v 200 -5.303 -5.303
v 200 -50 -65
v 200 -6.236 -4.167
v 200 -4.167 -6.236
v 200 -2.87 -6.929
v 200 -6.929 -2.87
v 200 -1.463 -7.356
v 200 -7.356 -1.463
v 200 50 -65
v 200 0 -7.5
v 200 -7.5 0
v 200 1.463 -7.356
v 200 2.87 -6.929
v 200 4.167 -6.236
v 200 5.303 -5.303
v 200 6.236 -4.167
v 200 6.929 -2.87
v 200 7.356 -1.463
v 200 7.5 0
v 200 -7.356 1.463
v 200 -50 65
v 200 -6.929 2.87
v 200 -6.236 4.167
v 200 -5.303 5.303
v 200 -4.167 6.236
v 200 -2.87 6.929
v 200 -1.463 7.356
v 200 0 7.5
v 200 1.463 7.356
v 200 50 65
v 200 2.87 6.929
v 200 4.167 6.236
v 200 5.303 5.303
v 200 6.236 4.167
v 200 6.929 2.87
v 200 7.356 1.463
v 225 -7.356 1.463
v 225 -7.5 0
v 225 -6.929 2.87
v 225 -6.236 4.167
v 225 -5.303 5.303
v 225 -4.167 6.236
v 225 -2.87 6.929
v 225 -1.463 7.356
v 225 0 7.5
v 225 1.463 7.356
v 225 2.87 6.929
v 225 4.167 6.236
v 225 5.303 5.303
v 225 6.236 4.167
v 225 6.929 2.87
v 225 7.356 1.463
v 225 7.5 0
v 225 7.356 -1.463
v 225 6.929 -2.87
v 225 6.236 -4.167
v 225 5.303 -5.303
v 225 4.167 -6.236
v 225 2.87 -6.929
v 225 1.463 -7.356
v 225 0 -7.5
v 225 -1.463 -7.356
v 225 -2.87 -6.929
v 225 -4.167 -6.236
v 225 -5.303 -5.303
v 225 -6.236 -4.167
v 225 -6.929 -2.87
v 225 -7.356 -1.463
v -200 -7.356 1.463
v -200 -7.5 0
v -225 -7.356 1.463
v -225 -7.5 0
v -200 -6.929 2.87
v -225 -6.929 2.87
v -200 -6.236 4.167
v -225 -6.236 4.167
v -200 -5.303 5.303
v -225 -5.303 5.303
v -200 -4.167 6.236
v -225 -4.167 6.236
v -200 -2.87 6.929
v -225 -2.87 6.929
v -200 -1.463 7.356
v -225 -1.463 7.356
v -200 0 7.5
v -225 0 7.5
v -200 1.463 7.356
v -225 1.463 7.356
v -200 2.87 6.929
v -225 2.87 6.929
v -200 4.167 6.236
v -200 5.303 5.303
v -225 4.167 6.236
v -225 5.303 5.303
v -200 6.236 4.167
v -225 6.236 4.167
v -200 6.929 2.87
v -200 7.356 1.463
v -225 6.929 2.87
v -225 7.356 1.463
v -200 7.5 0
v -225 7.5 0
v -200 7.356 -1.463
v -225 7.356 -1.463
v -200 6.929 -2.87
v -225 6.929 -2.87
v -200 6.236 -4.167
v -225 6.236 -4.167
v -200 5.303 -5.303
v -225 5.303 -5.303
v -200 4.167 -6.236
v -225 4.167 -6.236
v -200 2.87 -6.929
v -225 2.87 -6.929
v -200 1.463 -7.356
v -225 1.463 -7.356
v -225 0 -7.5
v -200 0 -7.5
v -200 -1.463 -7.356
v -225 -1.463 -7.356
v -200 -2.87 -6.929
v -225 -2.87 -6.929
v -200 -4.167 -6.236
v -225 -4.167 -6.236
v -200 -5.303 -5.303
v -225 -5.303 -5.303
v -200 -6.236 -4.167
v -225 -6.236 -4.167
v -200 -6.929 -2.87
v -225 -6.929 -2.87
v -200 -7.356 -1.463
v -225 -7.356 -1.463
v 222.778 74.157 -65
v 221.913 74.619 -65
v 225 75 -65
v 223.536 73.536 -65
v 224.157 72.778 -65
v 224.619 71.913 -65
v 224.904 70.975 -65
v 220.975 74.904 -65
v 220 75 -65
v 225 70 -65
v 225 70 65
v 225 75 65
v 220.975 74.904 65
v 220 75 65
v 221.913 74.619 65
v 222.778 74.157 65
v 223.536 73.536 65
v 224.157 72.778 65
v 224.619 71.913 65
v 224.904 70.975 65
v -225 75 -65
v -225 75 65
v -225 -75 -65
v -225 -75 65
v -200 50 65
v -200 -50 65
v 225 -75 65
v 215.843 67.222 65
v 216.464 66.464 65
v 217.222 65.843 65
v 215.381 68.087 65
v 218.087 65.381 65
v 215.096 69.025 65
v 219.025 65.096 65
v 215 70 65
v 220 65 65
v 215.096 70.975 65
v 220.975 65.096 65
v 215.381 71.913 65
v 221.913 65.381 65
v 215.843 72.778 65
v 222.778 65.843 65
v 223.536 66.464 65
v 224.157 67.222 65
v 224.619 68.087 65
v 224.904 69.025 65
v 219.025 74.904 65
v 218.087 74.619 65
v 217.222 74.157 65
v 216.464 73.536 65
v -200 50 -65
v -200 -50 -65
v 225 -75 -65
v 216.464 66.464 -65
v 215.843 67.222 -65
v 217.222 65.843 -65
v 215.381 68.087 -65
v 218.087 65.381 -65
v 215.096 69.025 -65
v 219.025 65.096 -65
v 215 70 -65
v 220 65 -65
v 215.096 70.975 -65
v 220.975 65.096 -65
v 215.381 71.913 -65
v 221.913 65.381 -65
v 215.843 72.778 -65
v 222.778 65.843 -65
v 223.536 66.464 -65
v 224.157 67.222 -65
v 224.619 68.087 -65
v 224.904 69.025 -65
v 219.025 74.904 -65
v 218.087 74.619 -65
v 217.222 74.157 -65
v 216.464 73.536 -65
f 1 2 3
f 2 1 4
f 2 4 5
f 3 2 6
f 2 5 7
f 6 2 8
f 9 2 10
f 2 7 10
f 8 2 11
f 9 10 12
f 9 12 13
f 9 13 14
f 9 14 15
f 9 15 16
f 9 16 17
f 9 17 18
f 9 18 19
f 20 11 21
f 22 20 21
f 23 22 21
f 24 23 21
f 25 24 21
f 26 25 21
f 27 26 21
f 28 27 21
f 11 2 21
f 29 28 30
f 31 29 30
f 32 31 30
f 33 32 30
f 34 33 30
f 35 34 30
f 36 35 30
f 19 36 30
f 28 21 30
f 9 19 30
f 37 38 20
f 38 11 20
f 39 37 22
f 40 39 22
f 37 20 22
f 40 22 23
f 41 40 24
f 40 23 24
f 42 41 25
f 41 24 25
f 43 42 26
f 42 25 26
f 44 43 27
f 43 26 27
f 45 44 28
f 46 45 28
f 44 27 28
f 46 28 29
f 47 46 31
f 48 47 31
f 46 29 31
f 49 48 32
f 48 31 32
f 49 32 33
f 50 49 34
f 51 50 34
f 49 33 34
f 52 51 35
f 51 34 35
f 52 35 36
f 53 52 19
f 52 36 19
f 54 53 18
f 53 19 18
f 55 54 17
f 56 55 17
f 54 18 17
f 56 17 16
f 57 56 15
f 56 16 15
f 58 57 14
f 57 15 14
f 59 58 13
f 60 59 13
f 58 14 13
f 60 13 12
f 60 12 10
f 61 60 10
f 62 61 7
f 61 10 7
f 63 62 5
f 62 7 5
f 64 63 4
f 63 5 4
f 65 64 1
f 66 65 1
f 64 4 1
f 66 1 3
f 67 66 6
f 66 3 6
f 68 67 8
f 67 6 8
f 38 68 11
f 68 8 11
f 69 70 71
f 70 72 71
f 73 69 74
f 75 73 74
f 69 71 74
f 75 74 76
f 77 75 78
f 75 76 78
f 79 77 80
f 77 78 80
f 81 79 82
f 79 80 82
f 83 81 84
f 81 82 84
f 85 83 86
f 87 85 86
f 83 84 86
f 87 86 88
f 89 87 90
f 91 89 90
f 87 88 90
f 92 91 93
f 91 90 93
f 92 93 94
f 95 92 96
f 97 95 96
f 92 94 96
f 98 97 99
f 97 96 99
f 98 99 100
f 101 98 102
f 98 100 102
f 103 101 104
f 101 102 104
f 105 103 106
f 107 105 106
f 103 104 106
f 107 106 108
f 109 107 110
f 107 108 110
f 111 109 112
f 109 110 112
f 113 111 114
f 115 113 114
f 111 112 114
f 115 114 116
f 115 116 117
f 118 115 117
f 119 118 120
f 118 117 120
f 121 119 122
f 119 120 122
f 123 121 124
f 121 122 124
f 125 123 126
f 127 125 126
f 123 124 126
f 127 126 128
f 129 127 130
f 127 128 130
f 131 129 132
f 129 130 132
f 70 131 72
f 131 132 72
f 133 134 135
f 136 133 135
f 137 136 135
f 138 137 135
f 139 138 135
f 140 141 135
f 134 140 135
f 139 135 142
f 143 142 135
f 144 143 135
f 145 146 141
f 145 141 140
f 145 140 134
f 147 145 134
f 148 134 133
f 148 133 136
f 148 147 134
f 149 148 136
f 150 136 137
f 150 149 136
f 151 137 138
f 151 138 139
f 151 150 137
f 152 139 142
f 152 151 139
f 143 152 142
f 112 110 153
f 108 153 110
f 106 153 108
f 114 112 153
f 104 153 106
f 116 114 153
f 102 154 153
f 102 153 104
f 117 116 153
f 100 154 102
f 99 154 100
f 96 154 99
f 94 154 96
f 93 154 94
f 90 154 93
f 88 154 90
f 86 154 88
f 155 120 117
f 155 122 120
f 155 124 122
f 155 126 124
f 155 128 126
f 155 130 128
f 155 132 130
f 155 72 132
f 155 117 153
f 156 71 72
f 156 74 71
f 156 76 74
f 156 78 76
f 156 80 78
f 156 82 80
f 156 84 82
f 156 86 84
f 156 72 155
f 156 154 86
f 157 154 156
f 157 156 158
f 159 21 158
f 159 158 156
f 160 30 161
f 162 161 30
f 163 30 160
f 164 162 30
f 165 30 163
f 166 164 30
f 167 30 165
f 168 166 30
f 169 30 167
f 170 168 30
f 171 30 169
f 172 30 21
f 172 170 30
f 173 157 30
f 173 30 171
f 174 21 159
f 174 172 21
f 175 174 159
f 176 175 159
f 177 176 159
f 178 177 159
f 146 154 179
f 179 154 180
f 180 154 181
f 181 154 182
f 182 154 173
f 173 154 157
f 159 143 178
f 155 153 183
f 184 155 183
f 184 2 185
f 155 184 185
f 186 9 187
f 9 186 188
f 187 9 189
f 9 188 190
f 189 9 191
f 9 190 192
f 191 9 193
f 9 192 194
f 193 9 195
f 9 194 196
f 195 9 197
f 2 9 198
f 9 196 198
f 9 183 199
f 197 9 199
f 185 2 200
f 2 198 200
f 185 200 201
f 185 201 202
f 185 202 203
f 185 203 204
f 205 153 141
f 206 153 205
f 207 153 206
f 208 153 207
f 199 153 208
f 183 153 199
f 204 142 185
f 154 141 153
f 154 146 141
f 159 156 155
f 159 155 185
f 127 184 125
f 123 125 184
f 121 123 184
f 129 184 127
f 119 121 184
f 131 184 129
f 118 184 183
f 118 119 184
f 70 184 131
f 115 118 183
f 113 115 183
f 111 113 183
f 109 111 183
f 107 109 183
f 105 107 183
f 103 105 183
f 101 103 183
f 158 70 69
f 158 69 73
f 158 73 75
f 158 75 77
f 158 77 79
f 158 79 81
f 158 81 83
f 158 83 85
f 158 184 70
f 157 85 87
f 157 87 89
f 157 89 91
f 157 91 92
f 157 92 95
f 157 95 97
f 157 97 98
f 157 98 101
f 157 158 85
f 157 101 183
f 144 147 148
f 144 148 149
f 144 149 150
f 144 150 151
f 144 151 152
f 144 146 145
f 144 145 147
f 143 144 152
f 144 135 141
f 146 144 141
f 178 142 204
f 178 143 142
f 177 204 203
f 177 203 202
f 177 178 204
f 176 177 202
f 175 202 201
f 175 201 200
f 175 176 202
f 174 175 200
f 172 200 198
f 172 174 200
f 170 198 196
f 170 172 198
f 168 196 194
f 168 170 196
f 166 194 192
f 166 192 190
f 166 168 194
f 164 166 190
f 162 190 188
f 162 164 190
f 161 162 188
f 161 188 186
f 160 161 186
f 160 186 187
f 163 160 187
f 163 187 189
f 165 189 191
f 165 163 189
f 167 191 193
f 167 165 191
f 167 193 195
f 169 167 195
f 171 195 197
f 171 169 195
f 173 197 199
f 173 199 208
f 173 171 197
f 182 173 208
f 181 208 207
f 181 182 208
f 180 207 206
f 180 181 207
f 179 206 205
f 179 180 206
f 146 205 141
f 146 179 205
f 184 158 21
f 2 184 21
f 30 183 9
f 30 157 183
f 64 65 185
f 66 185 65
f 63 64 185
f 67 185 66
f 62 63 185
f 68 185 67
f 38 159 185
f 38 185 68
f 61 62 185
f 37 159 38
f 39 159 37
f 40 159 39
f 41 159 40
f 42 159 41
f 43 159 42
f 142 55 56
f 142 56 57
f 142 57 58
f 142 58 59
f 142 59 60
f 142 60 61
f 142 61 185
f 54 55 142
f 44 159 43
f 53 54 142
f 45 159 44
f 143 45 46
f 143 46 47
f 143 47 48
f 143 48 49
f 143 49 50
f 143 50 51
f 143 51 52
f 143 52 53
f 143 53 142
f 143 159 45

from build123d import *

# Parameters (mm, degrees)
F0_W     = 400
F0_H     = 100
F1_DEPTH = 65
F2_R     = 7.5
F3_DEPTH = 500


with BuildPart() as f1:
    # F0 (on Top) → F1 (new body, symmetric)
    with BuildSketch(Plane.XY):
        with BuildLine():
            Line((219.9999999506, 75), (-225, 75))
            Line((-225, 75), (-225, -75))
            Line((-225, -75), (225, -75))
            Line((225, -75), (225, 70))
            ThreePointArc((225, 70), (216.4644661115, 66.4644660766), (219.9999999506, 75))
        make_face()
        Rectangle(F0_W, F0_H, mode=Mode.SUBTRACT)
    extrude(amount=F1_DEPTH, both=True)

    # F2 (on face) → F3 (cut, symmetric)
    with BuildSketch(Plane(origin=(-225, 0, 0), x_dir=(0, -1, 0), z_dir=(-1, 0, 0))):
        Circle(F2_R)
    extrude(amount=F3_DEPTH, both=True, mode=Mode.SUBTRACT)


with BuildPart() as f1b:
    # F0 (on Top) → F1, piece 2 (new body, symmetric)
    with BuildSketch(Plane.XY):
        with BuildLine():
            Line((225, 75), (219.9999999506, 75))
            ThreePointArc((219.9999999506, 75), (223.5355338885, 73.5355339234), (225, 70))
            Line((225, 70), (225, 75))
        make_face()
    extrude(amount=F1_DEPTH, both=True)


solid = Compound([f1.part, f1b.part])
